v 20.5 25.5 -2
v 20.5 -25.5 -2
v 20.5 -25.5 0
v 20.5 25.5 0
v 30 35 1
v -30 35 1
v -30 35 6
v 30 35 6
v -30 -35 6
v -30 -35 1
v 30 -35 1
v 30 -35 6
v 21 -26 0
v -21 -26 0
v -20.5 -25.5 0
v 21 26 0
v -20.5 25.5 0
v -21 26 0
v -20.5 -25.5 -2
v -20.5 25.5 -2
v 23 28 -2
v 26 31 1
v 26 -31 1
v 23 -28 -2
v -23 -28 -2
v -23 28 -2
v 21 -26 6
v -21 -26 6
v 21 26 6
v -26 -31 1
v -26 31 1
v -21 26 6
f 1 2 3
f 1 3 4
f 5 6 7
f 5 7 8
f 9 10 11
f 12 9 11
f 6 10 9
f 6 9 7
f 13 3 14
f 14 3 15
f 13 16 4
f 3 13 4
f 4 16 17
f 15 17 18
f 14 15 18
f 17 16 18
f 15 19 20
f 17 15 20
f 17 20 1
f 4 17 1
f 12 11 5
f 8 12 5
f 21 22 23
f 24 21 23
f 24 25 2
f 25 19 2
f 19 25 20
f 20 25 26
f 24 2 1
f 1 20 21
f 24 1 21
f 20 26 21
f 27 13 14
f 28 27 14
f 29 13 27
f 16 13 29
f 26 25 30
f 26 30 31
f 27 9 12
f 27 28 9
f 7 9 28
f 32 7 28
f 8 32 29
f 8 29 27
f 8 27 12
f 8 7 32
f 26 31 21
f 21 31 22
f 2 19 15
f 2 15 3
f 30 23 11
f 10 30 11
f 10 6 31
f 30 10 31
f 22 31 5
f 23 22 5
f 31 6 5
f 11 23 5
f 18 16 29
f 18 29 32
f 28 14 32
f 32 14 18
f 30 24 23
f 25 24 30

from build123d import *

# Parameters (mm, degrees)
EXTRUDE_1_DEPTH      = 6
EXTRUDE_1_DEPTH_BACK = 2
SKETCH_1_W           = 60
SKETCH_1_H           = 70
SKETCH_1_W_2         = 41
SKETCH_1_H_2         = 51
SKETCH_2_W           = 42
SKETCH_2_H           = 52
CUT_EXTRUDE_2_DEPTH  = 47.486557197
SKETCH_3_W           = 4
SKETCH_3_H           = 3
CHAMFER_2_SIZE       = 3


with BuildPart() as part:
    # Эскиз1 → Бобышка-Вытянуть1 (new, two sides: drawn at the far end of the back side and taken through both)
    with BuildSketch(Plane.XY.offset(-EXTRUDE_1_DEPTH_BACK)):
        Rectangle(SKETCH_1_W, SKETCH_1_H)
        Rectangle(SKETCH_1_W_2, SKETCH_1_H_2, mode=Mode.SUBTRACT)
    extrude(amount=EXTRUDE_1_DEPTH + EXTRUDE_1_DEPTH_BACK)

    # Эскиз2 → Вырез-Вытянуть2 (cut, through all)
    with BuildSketch(Plane(origin=(0, 0, 0), x_dir=(-1, 0, 0), z_dir=(0, 0, -1))):
        Rectangle(SKETCH_2_W, SKETCH_2_H)
    extrude(amount=-CUT_EXTRUDE_2_DEPTH, mode=Mode.SUBTRACT)

    # Вырез-По траектории1: sweep along a path in Эскиз4
    with BuildLine(Plane(origin=(0, 0, -2), x_dir=(-1, 0, 0), z_dir=(0, 0, -1))) as sweep_1_path:
        Line((-30, 35), (-30, -35))
        Line((-30, -35), (30, -35))
        Line((30, -35), (30, 35))
        Line((30, 35), (-30, 35))
    # Эскиз3 → Вырез-По траектории1 (sweep, cut)
    with BuildSketch(Plane(origin=(0, -35, 0), x_dir=(-1, 0, 0), z_dir=(0, -1, 0))):
        with Locations((-28, 0.5)):
            Rectangle(SKETCH_3_W, SKETCH_3_H)
    sweep(path=sweep_1_path.line, transition=Transition.RIGHT, mode=Mode.SUBTRACT)

    # Фаска2
    chamfer_2_edges = [part.edges().sort_by_distance(p)[0] for p in [
        (26, 0, -2),
        (0, 31, -2),
        (-26, 0, -2),
        (0, -31, -2),
    ]]
    chamfer(chamfer_2_edges, length=CHAMFER_2_SIZE - 0.0001)  # a hair under: the kernel refuses the full size


solid = part.part
